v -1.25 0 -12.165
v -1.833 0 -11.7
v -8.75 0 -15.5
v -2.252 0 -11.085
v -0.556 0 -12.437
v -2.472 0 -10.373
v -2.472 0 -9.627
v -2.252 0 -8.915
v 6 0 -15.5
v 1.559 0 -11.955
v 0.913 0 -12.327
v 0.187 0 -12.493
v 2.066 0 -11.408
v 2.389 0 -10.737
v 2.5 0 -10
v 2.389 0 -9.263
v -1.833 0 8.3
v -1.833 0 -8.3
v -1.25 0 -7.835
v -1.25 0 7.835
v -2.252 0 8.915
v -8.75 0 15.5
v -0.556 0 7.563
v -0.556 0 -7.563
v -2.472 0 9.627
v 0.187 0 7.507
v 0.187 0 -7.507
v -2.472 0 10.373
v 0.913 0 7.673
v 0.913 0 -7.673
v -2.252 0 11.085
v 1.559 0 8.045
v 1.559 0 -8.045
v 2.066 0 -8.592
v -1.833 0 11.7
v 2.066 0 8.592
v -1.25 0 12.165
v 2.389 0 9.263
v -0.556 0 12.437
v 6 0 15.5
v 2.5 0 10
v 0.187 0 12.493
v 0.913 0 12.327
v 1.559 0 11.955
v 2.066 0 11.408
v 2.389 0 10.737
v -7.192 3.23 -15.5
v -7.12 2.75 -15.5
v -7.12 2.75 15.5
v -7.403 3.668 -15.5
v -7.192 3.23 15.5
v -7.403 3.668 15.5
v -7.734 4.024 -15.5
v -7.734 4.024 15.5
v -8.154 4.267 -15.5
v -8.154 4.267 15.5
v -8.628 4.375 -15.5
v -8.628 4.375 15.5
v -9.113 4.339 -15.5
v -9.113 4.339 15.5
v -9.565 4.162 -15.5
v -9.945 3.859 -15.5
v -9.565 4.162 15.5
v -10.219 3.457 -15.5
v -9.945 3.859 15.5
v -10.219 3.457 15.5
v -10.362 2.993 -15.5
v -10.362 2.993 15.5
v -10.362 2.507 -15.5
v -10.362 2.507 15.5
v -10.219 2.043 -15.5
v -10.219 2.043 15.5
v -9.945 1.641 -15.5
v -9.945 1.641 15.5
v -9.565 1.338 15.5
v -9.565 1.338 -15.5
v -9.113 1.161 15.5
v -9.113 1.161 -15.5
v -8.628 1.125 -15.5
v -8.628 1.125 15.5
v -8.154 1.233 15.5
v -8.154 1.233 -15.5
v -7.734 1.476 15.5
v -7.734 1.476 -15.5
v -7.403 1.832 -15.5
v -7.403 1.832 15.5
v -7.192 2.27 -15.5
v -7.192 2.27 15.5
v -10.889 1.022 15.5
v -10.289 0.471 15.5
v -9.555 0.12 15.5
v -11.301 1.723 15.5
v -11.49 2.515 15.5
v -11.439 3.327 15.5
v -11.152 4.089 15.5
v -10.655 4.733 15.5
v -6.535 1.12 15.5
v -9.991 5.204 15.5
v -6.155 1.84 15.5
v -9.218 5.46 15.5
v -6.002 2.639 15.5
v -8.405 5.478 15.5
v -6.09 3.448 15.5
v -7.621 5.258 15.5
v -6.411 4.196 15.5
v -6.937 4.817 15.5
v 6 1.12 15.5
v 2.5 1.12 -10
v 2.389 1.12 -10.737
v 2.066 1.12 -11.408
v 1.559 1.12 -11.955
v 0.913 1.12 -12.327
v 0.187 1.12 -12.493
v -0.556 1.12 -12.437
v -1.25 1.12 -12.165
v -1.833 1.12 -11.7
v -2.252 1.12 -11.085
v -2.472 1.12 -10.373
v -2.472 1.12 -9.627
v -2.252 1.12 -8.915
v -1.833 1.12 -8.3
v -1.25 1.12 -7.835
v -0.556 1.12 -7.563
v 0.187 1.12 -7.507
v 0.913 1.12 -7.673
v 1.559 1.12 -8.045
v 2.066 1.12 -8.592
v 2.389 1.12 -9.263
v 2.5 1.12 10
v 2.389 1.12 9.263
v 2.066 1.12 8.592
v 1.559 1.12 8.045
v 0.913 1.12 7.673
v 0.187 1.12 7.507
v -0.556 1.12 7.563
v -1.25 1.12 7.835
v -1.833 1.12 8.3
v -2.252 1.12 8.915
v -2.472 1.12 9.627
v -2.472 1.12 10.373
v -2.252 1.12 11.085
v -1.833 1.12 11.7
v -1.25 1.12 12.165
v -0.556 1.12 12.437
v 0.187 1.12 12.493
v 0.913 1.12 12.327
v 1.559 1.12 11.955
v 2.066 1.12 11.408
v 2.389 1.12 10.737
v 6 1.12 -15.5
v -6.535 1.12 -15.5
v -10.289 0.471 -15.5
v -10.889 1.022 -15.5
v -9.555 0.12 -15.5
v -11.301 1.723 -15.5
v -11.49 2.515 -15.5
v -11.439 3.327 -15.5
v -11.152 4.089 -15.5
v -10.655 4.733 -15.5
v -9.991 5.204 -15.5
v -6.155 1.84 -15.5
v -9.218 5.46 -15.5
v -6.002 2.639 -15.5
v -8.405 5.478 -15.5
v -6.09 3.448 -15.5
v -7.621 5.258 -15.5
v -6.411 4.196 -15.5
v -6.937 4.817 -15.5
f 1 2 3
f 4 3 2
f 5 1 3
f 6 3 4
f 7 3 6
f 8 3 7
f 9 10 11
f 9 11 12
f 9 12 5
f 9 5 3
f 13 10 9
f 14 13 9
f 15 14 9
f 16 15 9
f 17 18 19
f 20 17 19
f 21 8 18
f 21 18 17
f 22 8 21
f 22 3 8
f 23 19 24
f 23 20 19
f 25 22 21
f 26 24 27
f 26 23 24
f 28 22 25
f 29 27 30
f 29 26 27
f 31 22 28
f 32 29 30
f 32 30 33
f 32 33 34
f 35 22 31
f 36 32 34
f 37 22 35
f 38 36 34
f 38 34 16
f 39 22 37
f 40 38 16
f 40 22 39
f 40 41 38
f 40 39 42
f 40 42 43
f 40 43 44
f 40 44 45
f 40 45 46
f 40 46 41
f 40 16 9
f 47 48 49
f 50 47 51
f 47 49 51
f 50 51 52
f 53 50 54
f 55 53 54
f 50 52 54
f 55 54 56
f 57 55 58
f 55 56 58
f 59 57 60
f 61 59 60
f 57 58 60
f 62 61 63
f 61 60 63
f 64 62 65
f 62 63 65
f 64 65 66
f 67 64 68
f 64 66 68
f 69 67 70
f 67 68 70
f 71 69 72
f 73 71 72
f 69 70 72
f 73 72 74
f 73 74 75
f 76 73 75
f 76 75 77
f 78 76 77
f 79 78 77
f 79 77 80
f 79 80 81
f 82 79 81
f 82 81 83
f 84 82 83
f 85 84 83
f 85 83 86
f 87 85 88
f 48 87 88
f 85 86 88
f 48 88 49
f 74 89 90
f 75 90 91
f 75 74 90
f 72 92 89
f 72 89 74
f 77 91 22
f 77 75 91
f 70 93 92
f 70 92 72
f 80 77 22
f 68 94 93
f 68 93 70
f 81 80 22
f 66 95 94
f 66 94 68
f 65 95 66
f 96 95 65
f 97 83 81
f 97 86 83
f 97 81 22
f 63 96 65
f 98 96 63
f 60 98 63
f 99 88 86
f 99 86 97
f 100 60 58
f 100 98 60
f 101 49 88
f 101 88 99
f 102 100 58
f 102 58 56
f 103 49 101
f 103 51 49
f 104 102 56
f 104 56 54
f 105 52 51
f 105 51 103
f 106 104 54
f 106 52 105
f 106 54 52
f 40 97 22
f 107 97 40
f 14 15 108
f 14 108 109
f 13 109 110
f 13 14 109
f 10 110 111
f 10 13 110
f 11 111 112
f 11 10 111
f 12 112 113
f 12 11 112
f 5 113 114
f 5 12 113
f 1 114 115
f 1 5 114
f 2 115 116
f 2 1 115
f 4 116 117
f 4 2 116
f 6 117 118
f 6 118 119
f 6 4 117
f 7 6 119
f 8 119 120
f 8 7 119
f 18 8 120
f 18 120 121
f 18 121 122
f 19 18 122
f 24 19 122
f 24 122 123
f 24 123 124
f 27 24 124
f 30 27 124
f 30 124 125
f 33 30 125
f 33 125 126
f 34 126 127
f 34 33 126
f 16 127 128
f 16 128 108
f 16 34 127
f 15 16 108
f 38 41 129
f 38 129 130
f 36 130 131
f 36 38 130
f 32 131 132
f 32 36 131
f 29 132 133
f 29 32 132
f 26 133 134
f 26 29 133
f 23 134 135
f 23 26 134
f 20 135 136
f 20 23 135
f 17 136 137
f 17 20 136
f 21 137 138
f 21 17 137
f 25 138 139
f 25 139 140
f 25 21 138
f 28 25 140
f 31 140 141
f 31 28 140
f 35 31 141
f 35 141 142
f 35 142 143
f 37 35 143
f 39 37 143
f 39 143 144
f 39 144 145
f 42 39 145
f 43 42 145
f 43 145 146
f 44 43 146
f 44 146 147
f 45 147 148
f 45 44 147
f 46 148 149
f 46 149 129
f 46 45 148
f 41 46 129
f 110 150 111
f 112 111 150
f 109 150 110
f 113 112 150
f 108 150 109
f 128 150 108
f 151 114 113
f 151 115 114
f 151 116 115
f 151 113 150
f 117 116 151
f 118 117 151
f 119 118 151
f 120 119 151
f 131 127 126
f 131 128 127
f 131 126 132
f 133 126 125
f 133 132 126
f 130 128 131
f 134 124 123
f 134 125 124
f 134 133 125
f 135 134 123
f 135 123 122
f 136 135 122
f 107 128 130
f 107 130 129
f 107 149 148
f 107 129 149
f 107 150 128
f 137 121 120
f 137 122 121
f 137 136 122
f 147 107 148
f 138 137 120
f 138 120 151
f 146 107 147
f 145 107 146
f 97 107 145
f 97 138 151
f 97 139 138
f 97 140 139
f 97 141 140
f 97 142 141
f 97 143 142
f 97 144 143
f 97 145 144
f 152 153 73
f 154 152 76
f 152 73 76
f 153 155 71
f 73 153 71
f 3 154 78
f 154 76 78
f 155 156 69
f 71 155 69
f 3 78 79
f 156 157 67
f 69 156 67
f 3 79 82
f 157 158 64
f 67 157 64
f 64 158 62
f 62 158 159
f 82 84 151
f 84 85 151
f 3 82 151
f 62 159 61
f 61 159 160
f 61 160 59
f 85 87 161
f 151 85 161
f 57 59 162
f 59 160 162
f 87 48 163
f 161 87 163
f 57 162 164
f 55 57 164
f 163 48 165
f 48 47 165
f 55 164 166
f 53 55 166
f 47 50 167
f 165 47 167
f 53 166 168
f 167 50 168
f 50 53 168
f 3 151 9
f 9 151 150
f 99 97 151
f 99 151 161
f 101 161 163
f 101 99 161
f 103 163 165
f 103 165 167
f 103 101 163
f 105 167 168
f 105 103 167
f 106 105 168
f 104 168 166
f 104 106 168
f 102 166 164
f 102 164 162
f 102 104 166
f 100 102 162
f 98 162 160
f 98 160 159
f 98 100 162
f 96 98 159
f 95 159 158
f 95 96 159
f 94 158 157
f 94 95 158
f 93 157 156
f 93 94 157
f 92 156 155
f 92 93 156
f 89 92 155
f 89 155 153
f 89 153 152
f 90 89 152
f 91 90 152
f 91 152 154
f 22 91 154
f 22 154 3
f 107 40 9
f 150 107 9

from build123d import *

# Parameters (mm, degrees)
SKETCH1_W           = 12
SKETCH1_H           = 31
SKETCH1_R           = 2.5
BOSS_EXTRUDE1_DEPTH = 1.12
SKETCH2_R           = 1.63
BOSS_EXTRUDE2_DEPTH = 31


with BuildPart() as part:
    # Sketch1 → Boss-Extrude1 (new body)
    with BuildSketch(Plane(origin=(0, 0, 0), x_dir=(1, 0, 0), z_dir=(0, 1, 0))):
        Rectangle(SKETCH1_W, SKETCH1_H)
        with Locations((0, 10)):
            Circle(SKETCH1_R, mode=Mode.SUBTRACT)
        with Locations((0, -10)):
            Circle(SKETCH1_R, mode=Mode.SUBTRACT)
    extrude(amount=BOSS_EXTRUDE1_DEPTH)

    # Sketch2 → Boss-Extrude2 (add)
    with BuildSketch(Plane.XY.offset(15.5)):
        with BuildLine():
            Line((-6, 1.12), (-6.535141088, 1.12))
            ThreePointArc((-6.535141088, 1.12), (-9.990967365, 5.204078238), (-8.75, 0))
            Line((-8.75, 0), (-6, 0))
            Line((-6, 0), (-6, 1.12))
        make_face()
        with Locations((-8.75, 2.75)):
            Circle(SKETCH2_R, mode=Mode.SUBTRACT)
    extrude(amount=-BOSS_EXTRUDE2_DEPTH)


solid = part.part
